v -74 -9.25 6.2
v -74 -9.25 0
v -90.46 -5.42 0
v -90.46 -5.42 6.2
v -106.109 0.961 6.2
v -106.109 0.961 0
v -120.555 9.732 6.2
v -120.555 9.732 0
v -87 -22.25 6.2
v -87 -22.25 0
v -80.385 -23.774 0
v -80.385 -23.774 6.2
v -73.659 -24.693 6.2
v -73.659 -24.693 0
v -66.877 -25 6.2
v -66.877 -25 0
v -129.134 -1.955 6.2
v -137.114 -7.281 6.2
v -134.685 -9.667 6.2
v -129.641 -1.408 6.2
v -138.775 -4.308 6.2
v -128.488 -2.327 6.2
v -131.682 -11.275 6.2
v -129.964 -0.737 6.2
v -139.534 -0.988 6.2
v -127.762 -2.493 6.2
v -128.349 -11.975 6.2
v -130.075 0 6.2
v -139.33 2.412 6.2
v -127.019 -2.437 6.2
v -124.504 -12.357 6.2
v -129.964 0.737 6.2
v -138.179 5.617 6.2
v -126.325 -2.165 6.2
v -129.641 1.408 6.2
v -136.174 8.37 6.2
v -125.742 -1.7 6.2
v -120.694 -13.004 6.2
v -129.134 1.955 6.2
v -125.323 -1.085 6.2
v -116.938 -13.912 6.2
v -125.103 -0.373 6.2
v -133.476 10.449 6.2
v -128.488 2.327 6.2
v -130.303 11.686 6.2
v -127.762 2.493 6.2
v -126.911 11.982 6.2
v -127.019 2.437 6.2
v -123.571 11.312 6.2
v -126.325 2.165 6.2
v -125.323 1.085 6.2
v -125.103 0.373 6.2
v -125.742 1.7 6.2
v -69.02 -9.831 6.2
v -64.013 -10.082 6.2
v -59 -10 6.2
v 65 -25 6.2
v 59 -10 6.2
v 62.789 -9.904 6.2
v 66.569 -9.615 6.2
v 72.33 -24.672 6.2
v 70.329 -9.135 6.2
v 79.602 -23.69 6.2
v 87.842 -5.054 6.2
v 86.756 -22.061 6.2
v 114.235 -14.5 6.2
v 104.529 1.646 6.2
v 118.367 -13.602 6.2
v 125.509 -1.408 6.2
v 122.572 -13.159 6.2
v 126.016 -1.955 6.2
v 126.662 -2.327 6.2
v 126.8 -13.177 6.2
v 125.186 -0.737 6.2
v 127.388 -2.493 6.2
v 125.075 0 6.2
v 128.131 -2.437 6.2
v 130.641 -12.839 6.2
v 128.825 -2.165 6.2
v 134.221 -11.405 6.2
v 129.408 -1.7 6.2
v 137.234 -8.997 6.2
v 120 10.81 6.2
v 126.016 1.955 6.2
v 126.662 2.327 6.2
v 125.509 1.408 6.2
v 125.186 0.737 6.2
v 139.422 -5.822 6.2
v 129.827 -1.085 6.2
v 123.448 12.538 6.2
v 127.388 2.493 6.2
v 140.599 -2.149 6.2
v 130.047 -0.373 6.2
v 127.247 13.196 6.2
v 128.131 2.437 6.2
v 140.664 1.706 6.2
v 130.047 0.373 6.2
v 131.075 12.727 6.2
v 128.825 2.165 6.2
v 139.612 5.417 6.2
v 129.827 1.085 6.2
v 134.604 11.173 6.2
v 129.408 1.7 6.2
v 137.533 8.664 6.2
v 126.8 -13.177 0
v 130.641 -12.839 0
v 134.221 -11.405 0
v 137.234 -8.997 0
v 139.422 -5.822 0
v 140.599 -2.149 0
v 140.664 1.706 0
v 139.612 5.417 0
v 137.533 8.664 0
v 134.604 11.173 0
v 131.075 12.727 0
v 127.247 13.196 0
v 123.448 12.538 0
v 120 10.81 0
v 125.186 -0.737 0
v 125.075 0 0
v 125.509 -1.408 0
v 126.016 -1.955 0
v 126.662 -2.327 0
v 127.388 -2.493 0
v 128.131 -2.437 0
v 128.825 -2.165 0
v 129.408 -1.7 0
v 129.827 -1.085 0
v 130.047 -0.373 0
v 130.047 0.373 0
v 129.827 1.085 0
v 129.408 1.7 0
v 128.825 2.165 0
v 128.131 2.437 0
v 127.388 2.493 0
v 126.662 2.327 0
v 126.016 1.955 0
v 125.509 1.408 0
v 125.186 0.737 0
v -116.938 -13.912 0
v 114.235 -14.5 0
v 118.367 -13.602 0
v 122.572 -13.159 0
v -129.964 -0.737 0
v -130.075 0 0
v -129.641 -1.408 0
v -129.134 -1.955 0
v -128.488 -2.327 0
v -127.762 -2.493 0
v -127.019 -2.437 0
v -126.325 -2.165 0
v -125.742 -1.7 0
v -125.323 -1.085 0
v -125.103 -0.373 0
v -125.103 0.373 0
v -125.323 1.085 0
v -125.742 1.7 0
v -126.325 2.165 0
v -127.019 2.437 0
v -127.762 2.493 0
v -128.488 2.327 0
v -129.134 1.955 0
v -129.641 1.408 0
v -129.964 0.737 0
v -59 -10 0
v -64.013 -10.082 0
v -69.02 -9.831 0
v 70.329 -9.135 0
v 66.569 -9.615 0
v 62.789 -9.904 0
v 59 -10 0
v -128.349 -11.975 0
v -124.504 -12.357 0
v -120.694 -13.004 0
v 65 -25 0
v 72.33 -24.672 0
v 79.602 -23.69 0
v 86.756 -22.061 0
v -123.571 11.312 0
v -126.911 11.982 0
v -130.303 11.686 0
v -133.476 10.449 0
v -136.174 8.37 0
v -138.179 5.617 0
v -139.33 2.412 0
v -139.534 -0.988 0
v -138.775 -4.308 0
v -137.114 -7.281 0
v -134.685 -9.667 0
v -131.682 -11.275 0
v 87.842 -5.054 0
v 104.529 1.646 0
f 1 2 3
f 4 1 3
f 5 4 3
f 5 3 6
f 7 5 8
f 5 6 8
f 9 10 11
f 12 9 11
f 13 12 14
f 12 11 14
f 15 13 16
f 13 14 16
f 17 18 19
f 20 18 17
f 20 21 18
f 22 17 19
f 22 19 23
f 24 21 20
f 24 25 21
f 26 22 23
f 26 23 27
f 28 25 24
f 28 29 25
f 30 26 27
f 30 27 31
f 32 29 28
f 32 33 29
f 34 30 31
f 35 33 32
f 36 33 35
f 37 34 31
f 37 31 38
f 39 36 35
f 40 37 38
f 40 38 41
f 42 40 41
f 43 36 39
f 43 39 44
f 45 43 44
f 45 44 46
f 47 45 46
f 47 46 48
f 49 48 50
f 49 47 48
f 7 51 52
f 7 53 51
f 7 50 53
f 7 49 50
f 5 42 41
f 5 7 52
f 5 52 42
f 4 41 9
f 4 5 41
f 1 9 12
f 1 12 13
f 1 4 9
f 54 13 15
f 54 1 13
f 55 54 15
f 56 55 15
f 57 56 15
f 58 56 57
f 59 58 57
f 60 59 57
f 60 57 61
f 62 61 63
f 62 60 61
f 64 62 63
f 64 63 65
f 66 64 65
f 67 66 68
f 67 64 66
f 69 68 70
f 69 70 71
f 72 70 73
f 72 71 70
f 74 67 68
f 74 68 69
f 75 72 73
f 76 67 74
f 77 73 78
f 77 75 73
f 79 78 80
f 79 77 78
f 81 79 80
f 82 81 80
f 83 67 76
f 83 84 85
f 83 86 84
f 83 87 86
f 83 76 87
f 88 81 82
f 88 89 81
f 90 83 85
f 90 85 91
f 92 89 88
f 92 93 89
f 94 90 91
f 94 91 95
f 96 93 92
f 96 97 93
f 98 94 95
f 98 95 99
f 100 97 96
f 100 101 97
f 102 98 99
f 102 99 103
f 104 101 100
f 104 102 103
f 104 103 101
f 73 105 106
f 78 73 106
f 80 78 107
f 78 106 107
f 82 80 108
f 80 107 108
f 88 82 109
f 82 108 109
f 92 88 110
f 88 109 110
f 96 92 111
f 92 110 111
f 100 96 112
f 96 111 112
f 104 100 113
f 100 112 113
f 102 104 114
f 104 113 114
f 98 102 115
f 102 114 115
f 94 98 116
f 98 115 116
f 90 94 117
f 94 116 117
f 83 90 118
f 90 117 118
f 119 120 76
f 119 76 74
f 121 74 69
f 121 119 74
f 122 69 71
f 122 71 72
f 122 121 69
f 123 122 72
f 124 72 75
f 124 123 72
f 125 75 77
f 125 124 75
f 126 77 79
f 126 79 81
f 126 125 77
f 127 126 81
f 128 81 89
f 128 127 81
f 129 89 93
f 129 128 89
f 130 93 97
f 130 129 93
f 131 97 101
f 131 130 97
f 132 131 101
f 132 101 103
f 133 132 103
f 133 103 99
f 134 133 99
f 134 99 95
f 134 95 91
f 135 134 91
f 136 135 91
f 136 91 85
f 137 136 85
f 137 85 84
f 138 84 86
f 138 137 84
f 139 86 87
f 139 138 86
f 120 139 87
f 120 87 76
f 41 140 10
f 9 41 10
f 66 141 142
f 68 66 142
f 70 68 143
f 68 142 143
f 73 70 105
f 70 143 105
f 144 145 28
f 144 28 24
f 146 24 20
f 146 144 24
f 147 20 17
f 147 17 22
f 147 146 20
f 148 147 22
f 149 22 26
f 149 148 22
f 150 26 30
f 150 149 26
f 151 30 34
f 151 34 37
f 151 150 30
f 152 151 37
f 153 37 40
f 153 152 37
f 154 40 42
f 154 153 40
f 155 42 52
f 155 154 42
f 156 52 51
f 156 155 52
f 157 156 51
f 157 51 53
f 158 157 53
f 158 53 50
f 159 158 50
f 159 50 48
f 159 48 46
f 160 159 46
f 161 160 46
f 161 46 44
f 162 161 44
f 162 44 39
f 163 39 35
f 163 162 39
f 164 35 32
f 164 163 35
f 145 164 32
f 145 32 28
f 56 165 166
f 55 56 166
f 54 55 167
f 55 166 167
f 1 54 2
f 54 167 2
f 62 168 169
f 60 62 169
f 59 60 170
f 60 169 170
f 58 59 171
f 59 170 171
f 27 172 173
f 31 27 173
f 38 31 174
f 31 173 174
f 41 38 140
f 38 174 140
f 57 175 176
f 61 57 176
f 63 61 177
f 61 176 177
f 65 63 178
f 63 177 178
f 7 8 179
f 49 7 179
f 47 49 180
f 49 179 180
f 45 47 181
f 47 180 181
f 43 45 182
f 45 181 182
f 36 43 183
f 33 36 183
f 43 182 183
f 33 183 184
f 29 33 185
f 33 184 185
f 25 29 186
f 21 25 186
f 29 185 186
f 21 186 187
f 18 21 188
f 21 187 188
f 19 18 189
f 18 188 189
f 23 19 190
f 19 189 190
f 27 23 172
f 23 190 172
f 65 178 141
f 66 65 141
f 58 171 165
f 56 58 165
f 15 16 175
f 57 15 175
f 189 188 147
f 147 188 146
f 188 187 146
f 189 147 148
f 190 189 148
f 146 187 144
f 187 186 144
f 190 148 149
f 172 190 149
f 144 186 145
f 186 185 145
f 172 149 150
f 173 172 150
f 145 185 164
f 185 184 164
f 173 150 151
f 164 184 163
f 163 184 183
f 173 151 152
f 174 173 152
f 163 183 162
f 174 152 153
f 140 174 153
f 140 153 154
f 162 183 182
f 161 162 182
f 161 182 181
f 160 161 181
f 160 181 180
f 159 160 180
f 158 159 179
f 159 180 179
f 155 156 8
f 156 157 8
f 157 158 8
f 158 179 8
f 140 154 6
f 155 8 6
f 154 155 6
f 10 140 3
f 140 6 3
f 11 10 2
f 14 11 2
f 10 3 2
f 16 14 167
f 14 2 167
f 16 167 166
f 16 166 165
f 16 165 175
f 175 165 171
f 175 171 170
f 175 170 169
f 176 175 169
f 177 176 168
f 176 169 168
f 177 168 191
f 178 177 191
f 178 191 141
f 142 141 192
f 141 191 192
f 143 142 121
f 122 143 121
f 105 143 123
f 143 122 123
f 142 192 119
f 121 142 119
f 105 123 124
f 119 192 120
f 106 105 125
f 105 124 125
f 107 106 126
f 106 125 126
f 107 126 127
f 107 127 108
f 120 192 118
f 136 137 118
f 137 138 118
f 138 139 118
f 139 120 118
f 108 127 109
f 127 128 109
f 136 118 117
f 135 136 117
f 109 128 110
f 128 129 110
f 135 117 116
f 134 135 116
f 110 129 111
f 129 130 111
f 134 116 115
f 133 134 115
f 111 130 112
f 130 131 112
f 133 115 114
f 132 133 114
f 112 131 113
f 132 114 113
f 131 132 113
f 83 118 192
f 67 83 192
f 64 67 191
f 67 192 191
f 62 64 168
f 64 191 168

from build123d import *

# Parameters (mm, degrees)
SKETCH1_R           = 2.5
BOSS_EXTRUDE1_DEPTH = 6.2


with BuildPart() as part:
    # Sketch1 → Boss-Extrude1 (new body)
    with BuildSketch(Plane.XY):
        with BuildLine():
            Line((-116.938372425, -13.911569107), (-87, -22.25))
            ThreePointArc((-87, -22.25), (-77.031989093, -24.309319739), (-66.876941087, -25))
            Line((-66.876941087, -25), (65, -25))
            ThreePointArc((65, -25), (75.977025607, -24.261995409), (86.756474933, -22.061265033))
            Line((86.756474933, -22.061265033), (114.235144317, -14.5))
            ThreePointArc((114.235144317, -14.5), (120.463338609, -13.323456153), (126.8, -13.177230394))
            ThreePointArc((126.8, -13.177230394), (140.274563377, 3.600104754), (120, 10.810161116))
            ThreePointArc((120, 10.810161116), (96.313236011, -2.023267975), (70.328890052, -9.134769615))
            ThreePointArc((70.328890052, -9.134769615), (64.680941239, -9.783377892), (59, -10))
            Line((59, -10), (-59, -10))
            ThreePointArc((-59, -10), (-66.518658645, -9.998172905), (-74, -9.25))
            ThreePointArc((-74, -9.25), (-98.410939741, -2.539404949), (-120.554503776, 9.732051233))
            ThreePointArc((-120.554503776, 9.732051233), (-138.868880222, 4.055609252), (-128.349445963, -11.974982784))
            ThreePointArc((-128.349445963, -11.974982784), (-122.593742509, -12.647675527), (-116.938372425, -13.911569107))
        make_face()
        with Locations(Location((127.574986581, 0, 0), (0, 0, 180))):
            Circle(SKETCH1_R, mode=Mode.SUBTRACT)
        with Locations(Location((-127.574986581, 0, 0), (0, 0, 180))):
            Circle(SKETCH1_R, mode=Mode.SUBTRACT)
    extrude(amount=BOSS_EXTRUDE1_DEPTH)


solid = part.part
